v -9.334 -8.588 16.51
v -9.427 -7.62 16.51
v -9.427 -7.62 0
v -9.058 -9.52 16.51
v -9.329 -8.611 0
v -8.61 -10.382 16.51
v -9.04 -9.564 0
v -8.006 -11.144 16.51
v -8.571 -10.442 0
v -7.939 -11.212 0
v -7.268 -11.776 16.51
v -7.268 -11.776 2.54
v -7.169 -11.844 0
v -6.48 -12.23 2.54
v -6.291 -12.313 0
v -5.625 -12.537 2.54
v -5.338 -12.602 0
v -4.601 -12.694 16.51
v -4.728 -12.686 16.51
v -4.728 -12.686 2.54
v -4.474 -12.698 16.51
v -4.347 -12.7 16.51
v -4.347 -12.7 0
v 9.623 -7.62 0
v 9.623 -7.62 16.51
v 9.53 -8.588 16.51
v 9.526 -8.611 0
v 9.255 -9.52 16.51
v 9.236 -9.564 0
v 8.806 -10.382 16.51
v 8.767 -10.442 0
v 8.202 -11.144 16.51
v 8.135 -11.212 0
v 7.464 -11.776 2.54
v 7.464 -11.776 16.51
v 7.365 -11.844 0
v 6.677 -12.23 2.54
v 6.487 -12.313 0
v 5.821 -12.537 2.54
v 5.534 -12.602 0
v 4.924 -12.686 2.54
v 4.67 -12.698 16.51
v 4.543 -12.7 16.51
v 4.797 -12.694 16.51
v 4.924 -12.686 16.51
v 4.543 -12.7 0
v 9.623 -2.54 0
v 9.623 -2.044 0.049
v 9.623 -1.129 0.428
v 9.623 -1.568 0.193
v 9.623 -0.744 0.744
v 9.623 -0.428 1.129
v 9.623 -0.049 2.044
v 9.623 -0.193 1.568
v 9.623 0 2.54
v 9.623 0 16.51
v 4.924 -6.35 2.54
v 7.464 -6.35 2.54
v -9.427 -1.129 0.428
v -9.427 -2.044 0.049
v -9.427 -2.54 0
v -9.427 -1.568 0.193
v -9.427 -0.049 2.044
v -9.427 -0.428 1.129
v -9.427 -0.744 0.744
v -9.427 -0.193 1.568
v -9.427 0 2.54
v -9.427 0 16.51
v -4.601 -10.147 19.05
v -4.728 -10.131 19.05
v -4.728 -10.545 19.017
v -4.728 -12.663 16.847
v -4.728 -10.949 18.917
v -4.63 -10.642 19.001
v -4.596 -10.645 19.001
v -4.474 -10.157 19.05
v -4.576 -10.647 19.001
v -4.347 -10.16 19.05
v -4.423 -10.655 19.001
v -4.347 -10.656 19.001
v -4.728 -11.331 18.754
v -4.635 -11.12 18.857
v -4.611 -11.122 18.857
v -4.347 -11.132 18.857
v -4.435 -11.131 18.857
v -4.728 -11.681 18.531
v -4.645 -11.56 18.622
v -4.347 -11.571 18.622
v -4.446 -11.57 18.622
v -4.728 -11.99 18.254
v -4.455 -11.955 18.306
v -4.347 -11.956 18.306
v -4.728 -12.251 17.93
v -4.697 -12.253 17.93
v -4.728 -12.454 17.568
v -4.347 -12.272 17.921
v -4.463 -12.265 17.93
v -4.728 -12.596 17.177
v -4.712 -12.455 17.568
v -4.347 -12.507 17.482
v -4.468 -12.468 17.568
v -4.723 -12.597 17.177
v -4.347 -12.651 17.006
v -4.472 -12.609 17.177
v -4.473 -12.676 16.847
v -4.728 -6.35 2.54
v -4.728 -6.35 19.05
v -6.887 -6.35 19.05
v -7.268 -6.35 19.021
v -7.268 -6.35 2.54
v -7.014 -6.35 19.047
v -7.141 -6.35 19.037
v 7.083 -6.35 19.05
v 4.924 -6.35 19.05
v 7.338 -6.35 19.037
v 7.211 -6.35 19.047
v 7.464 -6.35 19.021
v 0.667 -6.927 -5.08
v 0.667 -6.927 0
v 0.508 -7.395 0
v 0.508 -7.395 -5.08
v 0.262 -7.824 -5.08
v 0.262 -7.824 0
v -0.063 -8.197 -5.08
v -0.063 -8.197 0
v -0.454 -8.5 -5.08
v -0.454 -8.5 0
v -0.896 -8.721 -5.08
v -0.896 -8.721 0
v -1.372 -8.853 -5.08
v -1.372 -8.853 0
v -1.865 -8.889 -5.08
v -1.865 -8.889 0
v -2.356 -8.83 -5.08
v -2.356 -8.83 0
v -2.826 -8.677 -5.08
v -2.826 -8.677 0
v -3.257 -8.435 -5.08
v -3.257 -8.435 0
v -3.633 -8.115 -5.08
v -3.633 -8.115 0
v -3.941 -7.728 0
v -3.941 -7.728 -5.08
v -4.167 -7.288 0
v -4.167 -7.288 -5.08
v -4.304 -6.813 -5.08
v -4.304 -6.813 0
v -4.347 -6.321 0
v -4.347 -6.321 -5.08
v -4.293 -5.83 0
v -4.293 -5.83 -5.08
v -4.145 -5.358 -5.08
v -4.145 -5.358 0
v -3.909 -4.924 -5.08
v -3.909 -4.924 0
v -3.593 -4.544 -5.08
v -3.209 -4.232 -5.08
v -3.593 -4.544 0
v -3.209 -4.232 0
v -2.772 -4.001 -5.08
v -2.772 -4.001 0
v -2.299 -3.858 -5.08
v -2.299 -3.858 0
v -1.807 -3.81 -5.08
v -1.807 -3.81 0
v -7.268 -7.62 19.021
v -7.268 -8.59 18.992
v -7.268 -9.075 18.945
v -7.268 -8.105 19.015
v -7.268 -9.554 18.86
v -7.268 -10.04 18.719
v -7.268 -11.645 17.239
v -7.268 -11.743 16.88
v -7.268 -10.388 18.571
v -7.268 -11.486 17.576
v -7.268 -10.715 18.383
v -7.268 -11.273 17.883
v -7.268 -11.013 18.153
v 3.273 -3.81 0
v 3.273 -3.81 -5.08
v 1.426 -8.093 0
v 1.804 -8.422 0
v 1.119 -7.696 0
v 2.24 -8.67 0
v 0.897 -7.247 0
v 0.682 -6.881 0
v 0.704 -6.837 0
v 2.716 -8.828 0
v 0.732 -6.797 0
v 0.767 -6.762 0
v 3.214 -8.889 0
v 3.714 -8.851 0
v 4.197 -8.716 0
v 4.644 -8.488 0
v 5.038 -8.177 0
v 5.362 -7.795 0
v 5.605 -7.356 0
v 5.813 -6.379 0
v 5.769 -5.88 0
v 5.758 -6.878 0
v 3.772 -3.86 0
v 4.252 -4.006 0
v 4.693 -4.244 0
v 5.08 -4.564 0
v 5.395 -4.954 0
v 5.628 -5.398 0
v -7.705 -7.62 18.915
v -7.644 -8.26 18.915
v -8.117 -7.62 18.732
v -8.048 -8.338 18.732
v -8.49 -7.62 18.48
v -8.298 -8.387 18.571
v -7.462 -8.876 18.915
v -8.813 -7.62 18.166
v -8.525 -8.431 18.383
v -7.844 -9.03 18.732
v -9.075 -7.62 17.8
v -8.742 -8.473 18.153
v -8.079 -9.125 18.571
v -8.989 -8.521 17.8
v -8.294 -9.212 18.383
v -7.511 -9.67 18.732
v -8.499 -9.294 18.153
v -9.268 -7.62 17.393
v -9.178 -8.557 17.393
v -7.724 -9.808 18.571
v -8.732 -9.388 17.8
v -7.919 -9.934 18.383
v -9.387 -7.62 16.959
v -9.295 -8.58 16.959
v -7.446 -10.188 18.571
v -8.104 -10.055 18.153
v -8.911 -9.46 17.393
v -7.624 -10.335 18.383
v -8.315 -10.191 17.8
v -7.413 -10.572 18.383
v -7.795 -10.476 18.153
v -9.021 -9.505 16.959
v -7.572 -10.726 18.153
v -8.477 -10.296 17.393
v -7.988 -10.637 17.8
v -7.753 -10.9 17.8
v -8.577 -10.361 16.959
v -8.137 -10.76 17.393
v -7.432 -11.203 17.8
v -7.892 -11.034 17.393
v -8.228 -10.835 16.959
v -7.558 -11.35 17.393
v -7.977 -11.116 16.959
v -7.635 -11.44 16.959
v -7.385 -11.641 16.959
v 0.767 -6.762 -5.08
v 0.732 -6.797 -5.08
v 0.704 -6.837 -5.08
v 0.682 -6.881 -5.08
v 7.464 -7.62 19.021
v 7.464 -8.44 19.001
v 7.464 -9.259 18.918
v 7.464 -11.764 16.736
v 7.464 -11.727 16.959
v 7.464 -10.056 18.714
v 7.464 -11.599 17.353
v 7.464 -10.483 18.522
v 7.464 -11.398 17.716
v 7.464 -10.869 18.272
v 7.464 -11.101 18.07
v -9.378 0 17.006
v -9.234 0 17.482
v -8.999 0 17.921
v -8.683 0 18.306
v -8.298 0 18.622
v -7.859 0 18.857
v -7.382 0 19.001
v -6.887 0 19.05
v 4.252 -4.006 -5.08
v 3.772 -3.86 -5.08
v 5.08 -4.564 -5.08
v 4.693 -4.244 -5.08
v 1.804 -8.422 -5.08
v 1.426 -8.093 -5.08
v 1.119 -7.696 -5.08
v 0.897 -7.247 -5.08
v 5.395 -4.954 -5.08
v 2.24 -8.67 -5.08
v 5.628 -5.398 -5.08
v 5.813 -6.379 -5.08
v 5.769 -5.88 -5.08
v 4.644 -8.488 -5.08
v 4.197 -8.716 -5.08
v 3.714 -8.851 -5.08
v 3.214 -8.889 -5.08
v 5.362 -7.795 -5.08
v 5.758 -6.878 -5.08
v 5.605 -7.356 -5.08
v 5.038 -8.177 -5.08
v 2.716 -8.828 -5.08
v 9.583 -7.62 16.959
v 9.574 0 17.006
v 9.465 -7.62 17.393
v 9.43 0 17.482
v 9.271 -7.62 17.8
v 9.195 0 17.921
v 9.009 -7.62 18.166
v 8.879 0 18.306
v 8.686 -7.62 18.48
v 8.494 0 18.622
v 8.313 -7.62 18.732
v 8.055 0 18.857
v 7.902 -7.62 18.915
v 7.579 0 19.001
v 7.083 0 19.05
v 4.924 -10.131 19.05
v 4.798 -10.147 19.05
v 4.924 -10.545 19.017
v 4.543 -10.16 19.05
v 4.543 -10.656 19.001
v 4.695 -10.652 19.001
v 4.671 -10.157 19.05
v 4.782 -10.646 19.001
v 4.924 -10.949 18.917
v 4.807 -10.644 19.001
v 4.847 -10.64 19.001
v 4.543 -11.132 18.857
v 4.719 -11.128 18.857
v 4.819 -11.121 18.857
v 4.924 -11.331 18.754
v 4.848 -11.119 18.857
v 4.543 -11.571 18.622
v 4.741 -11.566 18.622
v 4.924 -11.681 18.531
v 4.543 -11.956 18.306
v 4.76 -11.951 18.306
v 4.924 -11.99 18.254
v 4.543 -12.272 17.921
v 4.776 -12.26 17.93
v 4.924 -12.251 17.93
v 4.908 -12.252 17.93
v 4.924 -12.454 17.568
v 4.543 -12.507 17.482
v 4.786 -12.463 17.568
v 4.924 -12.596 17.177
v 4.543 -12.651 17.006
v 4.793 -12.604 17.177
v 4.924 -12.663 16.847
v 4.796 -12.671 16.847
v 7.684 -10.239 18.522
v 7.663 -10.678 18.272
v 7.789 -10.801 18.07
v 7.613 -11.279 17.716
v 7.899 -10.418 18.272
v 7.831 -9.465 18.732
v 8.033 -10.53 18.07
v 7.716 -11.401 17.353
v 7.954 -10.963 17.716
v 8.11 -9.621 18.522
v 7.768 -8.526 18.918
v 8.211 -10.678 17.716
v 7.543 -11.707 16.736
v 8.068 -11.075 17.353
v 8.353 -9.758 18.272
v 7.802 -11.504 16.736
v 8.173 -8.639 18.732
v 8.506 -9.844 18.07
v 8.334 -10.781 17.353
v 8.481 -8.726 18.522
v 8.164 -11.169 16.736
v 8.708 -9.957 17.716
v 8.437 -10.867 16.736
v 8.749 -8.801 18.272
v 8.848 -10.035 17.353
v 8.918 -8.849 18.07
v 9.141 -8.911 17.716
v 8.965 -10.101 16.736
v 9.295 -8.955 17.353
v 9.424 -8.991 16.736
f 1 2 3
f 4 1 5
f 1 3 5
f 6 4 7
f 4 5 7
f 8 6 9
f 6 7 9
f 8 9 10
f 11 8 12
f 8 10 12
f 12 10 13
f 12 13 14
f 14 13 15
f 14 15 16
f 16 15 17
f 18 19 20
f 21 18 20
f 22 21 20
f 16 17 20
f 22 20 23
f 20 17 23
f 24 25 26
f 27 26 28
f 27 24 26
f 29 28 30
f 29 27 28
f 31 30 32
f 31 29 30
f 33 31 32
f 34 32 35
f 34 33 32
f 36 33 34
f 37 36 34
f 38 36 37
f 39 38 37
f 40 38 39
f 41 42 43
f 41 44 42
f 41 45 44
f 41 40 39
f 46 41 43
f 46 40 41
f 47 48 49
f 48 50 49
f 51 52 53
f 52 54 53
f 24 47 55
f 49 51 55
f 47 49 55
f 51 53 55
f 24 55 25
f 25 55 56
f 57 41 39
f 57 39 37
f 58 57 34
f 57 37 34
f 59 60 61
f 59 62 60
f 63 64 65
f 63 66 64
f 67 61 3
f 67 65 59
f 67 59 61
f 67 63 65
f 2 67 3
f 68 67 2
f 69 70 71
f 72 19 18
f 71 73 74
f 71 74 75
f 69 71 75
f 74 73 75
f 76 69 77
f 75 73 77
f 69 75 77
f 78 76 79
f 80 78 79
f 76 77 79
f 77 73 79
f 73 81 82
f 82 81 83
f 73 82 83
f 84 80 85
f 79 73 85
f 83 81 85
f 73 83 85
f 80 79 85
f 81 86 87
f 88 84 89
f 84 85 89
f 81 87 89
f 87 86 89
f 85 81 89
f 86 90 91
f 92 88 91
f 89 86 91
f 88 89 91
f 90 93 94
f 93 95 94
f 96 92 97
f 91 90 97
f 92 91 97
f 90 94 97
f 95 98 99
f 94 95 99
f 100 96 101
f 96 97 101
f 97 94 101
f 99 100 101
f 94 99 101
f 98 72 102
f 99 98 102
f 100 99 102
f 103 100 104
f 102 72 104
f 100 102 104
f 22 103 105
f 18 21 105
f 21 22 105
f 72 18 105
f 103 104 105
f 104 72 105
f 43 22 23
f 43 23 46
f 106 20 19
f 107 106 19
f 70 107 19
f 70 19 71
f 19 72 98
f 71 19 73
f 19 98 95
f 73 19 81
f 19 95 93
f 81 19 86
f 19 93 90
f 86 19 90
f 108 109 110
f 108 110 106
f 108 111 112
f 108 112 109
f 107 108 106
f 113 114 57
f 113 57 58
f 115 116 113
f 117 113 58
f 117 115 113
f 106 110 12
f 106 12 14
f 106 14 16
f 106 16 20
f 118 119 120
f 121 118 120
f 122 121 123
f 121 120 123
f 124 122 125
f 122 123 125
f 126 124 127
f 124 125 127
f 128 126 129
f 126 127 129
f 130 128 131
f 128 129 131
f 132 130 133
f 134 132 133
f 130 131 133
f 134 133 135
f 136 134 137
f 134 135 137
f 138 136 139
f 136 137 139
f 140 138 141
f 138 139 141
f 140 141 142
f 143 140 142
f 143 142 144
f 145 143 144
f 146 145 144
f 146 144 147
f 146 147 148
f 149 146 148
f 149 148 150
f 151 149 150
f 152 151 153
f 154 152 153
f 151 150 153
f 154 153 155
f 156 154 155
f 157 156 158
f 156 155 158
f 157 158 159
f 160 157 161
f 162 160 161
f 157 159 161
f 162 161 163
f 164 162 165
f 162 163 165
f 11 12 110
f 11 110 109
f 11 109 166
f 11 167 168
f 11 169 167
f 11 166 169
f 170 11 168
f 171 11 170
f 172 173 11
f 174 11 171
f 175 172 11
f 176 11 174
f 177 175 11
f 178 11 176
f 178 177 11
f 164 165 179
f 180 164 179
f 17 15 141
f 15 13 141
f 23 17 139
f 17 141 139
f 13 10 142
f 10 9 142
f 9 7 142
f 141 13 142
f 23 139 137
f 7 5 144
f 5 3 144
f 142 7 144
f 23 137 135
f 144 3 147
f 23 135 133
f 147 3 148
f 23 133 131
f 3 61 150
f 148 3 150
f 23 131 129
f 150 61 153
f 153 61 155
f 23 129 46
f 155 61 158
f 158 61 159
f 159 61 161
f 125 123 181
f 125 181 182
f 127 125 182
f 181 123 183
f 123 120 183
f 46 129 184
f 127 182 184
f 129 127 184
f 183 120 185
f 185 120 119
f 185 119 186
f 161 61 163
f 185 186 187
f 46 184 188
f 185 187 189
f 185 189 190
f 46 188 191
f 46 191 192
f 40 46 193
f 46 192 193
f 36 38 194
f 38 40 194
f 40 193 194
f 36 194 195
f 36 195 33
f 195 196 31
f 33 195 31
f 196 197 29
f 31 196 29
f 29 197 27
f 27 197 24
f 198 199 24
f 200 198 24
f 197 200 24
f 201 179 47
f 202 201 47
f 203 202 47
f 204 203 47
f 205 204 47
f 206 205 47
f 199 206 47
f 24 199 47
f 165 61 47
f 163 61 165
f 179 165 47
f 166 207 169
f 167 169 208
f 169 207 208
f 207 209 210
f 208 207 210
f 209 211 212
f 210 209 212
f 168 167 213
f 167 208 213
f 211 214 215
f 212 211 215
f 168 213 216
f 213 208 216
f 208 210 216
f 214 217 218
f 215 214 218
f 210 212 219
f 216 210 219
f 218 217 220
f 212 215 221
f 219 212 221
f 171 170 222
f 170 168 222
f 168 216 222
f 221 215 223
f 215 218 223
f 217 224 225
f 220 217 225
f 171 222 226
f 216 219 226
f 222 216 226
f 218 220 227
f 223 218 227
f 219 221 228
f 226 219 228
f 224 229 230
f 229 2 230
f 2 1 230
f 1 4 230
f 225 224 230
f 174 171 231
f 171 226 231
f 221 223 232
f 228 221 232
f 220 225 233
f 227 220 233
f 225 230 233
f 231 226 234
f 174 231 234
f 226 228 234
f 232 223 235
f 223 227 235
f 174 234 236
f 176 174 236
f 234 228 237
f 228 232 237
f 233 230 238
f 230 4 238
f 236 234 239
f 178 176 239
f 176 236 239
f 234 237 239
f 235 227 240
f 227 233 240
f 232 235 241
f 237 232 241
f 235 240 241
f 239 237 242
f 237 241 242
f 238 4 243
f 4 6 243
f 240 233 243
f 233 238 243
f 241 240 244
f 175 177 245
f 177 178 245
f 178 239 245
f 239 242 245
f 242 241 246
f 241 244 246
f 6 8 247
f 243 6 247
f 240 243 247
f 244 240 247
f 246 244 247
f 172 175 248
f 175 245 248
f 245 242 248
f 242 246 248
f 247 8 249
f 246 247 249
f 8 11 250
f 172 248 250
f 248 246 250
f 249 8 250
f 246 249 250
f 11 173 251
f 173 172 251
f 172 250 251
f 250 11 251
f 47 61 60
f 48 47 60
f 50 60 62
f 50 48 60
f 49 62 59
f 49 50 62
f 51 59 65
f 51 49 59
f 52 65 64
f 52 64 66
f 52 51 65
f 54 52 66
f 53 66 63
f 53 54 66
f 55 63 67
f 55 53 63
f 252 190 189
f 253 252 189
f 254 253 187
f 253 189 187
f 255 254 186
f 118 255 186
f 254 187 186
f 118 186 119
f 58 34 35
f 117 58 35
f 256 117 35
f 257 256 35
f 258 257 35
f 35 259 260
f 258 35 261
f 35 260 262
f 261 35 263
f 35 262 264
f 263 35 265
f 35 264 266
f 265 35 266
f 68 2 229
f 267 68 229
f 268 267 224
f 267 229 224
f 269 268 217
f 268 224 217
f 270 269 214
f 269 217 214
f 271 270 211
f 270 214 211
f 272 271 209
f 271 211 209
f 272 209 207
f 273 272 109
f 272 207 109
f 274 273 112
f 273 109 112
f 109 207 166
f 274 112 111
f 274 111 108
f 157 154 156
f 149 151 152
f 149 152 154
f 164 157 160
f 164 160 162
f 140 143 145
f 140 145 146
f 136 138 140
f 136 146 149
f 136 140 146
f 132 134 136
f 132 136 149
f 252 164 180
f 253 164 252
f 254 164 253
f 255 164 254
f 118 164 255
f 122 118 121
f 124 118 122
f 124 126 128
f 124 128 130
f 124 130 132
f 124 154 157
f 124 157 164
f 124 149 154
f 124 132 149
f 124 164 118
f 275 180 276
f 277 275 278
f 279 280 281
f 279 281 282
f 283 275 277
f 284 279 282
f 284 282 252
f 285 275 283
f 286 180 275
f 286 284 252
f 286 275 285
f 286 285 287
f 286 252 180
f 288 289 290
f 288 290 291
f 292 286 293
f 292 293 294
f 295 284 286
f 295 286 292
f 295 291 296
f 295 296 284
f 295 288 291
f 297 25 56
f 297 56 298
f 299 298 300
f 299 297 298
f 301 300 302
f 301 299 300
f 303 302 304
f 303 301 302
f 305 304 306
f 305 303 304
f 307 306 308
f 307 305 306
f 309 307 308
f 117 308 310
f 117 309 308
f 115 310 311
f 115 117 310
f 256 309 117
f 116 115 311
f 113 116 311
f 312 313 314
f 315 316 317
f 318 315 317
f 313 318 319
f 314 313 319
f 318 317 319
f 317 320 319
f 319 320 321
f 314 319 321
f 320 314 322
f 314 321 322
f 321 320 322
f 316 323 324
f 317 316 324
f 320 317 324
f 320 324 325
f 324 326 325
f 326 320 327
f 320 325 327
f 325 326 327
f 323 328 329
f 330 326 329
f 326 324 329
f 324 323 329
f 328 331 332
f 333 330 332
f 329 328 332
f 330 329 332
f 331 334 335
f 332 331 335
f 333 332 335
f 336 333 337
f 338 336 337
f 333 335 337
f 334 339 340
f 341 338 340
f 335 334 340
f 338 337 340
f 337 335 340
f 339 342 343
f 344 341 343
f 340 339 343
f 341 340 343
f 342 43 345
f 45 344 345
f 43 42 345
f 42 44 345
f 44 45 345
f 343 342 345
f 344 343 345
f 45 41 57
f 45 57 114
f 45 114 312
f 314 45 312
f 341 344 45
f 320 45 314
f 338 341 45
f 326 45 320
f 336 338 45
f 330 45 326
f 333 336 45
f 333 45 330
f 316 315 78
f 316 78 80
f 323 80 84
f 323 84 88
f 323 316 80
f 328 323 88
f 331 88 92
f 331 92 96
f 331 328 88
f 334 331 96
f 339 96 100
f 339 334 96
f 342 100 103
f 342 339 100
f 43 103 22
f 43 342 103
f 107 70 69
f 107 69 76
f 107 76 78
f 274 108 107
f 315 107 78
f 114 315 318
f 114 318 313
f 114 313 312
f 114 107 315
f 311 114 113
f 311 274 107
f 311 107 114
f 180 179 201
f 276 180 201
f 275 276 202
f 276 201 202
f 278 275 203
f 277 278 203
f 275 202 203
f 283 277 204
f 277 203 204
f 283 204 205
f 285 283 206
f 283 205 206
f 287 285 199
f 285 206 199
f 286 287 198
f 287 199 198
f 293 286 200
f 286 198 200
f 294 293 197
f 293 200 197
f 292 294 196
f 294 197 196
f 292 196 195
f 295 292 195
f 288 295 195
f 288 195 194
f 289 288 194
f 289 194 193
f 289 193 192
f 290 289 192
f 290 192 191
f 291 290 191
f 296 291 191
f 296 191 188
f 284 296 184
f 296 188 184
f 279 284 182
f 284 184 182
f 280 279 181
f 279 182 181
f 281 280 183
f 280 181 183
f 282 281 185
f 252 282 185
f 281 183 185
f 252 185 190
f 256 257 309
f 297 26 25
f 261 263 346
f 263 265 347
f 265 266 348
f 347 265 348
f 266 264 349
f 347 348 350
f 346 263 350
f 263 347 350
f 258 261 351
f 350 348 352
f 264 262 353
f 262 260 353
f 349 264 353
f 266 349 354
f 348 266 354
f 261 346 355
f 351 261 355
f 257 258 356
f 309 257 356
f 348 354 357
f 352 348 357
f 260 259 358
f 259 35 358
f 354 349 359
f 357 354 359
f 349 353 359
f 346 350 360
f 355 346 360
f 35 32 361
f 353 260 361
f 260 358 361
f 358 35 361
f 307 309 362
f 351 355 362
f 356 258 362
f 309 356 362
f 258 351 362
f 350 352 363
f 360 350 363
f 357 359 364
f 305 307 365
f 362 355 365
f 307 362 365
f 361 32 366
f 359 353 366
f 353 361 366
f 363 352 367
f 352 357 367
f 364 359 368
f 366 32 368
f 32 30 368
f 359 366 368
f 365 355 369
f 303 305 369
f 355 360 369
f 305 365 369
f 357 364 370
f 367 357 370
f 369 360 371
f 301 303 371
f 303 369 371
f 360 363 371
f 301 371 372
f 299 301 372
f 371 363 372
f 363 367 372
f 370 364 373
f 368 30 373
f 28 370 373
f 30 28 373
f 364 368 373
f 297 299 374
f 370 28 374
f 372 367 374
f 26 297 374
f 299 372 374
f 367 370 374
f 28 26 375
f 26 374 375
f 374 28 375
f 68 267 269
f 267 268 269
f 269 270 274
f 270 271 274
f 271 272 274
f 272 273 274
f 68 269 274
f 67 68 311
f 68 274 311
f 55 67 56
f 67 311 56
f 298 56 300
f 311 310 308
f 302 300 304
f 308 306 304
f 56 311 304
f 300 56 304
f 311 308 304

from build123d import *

# Parameters (mm, degrees)
F0_W        = 19.05
F0_H        = 19.05
F1_DEPTH    = 12.7
F2_R        = 2.54
F3_T1_DEPTH = 31.75
F3_T4_ANGLE = 90
F3_T6_ANGLE = 90
F5_W        = 2.54
F5_H        = 16.51
F6_DEPTH    = 6.35
F7_R        = 2.54
F9_DEPTH    = 5.08


# Not quite as in the source:
# - a fillet or chamfer that OpenCascade refuses, or shapes differently, is made with other operations: its cross-section is extruded or revolved along the edge and cut away or added


with BuildPart() as f1:
    # F0 (on Front) → F1 (new body)
    with BuildSketch(Plane.XZ):
        with Locations((0.0981341409, 9.525)):
            Rectangle(F0_W, F0_H)
    extrude(amount=F1_DEPTH)

    # F2
    f2_edges = [f1.edges().sort_by_distance(p)[0] for p in [
        (9.623134, -6.35, 19.05),
        (-9.426866, -6.35, 19.05),
        (0.098134, -12.7, 19.05),
    ]]
    fillet(f2_edges, radius=F2_R)

    # F3: fillet of radius 5.08 on 2 edges, made by hand

    # F3_s2 → F3_t1 (cut)
    with BuildSketch(Plane.XY.offset(-12.7)):
        with BuildLine():
            ThreePointArc((9.6231341409, -7.62), (8.1352365894, -11.2121024484), (4.5431341409, -12.7))
            Line((4.5431341409, -12.7), (9.6231341409, -12.7))
            Line((9.6231341409, -12.7), (9.6231341409, -7.62))
        make_face()
        with BuildLine():
            ThreePointArc((-9.4268658591, -7.62), (-7.9389683075, -11.2121024484), (-4.3468658591, -12.7))
            Line((-4.3468658591, -12.7), (-9.4268658591, -12.7))
            Line((-9.4268658591, -12.7), (-9.4268658591, -7.62))
        make_face()
    extrude(amount=F3_T1_DEPTH, mode=Mode.SUBTRACT)

    # F3_s3 → F3_t4 (revolve, cut)
    with BuildSketch(Plane.XZ.offset(7.62)):
        with BuildLine():
            ThreePointArc((-6.8868658591, 19.05), (-8.6829170833, 18.3060512242), (-9.4268658591, 16.51))
            Line((-9.4268658591, 16.51), (-9.4268658591, 19.05))
            Line((-9.4268658591, 19.05), (-6.8868658591, 19.05))
        make_face()
    revolve(axis=Axis((-4.3468658591, -7.62, 19.05), (0, 0, 1)), revolution_arc=F3_T4_ANGLE, mode=Mode.SUBTRACT)

    # F3_s5 → F3_t6 (revolve, cut)
    with BuildSketch(Plane.YZ.offset(4.5431341409)):
        with BuildLine():
            ThreePointArc((-10.16, 19.05), (-11.9560512242, 18.3060512242), (-12.7, 16.51))
            Line((-12.7, 16.51), (-12.7, 19.05))
            Line((-12.7, 19.05), (-10.16, 19.05))
        make_face()
    revolve(axis=Axis((4.5431341409, -7.62, 19.05), (0, 0, 1)), revolution_arc=F3_T6_ANGLE, mode=Mode.SUBTRACT)

    # F5 (on offset) → F6 (cut)
    with BuildSketch(Plane.XZ.offset(12.7)):
        with Locations((-5.9978658591, 10.795)):
            Rectangle(F5_W, F5_H)
        with Locations((6.1941341409, 10.795)):
            Rectangle(F5_W, F5_H)
    extrude(amount=-F6_DEPTH, mode=Mode.SUBTRACT)

    # F7
    f7_edges = [f1.edges().sort_by_distance(p)[0] for p in [
        (0.098134, 0, 0),
    ]]
    fillet(f7_edges, radius=F7_R)

    # F8 (on face) → F9 (join)
    with BuildSketch(Plane(origin=(0, 0, 0), x_dir=(1, 0, 0), z_dir=(0, 0, -1))):
        with BuildLine():
            ThreePointArc((0.7668002065, 6.7621773998), (0.7035904263, 6.8367161594), (0.6666799214, 6.927209903))
            ThreePointArc((0.6666799214, 6.927209903), (-3.7965534166, 7.9288424314), (-1.8068658591, 3.81))
            Line((-1.8068658591, 3.81), (3.2731341493, 3.81))
            ThreePointArc((3.2731341493, 3.81), (5.2094361027, 7.9938779495), (0.7668002065, 6.7621773998))
        make_face()
    extrude(amount=F9_DEPTH)


solid = f1.part
